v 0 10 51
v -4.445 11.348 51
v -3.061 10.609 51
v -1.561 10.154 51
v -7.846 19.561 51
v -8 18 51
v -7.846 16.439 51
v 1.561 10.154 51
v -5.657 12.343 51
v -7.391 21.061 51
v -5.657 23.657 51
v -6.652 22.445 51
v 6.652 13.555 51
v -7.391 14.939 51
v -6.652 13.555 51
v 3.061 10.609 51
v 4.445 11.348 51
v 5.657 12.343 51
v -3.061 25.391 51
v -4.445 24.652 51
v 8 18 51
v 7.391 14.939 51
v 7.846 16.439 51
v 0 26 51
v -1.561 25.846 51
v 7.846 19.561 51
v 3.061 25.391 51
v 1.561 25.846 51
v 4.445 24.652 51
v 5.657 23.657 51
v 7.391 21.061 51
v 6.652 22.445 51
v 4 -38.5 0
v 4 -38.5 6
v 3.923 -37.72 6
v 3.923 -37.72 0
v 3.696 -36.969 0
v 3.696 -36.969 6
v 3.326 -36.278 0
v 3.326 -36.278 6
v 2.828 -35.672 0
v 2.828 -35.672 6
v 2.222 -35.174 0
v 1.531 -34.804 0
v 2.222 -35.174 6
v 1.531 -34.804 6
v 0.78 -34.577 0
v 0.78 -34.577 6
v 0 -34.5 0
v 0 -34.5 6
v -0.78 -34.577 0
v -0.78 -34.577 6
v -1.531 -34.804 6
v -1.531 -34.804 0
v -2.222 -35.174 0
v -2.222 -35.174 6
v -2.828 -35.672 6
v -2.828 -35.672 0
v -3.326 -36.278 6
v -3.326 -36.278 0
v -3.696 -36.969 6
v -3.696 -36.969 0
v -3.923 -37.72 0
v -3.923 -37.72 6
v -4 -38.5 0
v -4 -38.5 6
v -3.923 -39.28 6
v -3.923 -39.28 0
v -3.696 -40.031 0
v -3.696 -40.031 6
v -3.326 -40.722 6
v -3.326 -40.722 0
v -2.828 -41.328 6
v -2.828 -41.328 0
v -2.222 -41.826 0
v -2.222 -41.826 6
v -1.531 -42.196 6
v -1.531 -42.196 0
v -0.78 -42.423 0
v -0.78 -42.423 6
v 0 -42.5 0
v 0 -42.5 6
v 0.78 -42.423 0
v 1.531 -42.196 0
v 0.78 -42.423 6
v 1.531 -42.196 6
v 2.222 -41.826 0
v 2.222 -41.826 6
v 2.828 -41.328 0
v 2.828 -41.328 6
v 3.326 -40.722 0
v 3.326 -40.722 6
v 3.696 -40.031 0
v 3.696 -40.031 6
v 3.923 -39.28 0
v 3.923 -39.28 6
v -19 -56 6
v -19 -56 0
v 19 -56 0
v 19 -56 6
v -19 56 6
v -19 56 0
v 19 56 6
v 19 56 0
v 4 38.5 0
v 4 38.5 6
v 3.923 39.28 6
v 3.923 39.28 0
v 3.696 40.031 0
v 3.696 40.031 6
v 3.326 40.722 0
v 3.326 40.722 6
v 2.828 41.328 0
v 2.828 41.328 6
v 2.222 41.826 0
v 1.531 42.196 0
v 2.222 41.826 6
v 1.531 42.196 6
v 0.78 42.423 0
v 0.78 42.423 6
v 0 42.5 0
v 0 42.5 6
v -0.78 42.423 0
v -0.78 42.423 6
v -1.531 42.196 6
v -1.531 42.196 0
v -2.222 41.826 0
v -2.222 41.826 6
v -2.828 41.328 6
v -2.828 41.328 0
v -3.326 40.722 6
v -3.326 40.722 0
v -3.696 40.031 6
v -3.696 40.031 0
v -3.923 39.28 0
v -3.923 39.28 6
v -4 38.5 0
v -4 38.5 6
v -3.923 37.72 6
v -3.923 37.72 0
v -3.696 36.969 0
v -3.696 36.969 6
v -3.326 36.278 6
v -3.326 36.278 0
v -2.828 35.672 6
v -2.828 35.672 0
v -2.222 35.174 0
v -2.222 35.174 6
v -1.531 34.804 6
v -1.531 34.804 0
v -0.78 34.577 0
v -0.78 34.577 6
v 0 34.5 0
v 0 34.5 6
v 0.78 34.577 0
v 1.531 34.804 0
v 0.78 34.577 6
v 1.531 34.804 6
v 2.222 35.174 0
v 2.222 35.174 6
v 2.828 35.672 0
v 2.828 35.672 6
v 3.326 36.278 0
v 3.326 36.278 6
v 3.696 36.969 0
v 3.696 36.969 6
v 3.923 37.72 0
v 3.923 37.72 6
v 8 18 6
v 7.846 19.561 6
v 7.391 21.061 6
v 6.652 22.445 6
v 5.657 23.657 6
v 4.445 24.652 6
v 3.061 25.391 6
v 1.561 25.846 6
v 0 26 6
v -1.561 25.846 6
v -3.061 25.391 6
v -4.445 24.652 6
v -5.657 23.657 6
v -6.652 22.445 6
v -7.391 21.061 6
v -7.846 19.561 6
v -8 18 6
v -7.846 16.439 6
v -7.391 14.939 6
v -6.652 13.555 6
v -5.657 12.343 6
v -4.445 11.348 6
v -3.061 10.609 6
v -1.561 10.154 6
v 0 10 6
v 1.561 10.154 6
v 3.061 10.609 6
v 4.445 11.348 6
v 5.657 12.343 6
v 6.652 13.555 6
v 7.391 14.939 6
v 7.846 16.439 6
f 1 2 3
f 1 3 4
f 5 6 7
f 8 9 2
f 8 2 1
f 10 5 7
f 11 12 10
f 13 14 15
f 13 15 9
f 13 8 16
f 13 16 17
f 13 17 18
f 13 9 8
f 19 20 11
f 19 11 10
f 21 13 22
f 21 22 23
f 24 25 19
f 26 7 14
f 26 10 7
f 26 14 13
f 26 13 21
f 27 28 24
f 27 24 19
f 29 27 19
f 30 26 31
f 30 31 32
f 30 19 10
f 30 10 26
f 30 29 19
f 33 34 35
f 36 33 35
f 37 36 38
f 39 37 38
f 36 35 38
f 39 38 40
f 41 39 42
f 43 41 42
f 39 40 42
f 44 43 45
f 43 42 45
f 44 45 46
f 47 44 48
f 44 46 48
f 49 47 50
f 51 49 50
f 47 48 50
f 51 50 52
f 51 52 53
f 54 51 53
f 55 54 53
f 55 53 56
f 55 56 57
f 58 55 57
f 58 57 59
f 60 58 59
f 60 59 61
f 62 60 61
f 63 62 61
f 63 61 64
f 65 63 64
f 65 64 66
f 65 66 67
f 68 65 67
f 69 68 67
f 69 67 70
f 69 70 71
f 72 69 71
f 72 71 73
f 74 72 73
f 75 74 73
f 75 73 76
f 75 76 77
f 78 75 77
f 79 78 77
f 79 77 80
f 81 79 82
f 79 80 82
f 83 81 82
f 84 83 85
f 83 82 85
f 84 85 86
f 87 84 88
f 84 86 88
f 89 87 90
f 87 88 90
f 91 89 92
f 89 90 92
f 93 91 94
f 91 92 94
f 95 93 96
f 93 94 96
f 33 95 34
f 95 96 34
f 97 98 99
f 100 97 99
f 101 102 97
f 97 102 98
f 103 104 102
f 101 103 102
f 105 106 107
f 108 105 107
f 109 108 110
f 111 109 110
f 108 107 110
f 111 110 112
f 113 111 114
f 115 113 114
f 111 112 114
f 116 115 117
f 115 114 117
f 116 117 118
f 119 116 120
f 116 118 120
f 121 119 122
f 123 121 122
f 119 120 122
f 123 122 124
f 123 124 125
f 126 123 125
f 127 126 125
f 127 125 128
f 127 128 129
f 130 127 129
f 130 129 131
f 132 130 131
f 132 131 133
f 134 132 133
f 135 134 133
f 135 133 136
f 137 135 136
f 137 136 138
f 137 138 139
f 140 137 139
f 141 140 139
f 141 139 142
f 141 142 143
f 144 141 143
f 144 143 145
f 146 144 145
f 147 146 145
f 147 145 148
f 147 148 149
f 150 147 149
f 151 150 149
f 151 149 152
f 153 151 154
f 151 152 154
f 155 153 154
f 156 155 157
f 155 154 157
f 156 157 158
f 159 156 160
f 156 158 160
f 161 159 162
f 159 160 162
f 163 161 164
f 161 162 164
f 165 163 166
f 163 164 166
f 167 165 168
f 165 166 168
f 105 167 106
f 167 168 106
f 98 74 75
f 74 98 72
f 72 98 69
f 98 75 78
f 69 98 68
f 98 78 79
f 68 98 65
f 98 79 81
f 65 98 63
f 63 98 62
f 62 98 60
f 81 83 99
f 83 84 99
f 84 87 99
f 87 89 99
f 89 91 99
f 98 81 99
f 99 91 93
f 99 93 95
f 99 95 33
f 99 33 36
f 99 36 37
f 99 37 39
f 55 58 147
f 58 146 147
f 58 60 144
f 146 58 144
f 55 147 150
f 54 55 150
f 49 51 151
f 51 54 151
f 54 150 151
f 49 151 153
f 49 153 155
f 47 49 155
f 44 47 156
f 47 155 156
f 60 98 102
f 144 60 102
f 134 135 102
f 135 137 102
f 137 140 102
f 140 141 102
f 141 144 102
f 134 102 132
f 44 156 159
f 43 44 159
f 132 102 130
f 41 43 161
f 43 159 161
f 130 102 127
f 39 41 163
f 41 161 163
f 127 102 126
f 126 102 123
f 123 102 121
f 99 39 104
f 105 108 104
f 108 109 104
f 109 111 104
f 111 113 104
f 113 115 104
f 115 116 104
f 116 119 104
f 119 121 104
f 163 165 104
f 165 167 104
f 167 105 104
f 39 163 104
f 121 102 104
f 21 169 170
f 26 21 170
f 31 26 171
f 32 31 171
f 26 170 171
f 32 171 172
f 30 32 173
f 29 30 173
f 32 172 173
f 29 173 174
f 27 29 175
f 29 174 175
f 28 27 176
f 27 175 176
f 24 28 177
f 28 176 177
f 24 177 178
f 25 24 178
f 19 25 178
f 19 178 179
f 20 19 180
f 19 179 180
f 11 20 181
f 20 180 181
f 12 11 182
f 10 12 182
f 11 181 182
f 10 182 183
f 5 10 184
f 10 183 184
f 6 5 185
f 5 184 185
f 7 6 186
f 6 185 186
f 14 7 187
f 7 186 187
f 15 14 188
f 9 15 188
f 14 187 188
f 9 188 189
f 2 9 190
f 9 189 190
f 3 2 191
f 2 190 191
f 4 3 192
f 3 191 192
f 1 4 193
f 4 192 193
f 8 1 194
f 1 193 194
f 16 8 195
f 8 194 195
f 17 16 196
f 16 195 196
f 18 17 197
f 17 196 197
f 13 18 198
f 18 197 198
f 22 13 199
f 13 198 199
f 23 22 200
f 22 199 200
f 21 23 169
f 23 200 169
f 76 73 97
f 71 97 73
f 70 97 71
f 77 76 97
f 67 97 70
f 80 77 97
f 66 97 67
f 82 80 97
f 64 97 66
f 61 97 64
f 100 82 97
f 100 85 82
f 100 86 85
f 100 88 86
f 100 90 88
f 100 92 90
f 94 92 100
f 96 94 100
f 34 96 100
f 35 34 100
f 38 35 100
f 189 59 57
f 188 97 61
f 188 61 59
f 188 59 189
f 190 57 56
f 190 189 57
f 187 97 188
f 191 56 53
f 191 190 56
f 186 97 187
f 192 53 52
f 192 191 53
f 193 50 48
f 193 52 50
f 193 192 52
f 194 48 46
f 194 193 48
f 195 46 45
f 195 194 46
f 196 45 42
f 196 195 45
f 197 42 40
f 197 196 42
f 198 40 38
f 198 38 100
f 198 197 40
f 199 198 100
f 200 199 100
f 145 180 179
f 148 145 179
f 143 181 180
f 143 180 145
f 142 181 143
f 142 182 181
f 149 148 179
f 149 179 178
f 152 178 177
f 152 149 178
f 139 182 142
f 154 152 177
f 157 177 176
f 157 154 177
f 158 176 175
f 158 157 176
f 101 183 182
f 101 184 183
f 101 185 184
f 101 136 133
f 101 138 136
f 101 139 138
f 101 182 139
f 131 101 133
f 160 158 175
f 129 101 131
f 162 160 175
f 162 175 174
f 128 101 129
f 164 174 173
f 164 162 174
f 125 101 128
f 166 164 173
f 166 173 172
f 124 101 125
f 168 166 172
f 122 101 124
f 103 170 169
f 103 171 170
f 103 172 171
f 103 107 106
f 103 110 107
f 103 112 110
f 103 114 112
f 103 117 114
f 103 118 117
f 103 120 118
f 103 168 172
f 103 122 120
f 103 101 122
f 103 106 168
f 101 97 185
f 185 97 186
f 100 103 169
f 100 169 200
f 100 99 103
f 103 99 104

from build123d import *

# Parameters (mm, degrees)
F1_DEPTH = 6
F2_R     = 4
F3_DEPTH = 6.001
F4_R     = 8
F5_DEPTH = 45


# Not quite as in the source:
# - a feature names something its author has since deleted; it is built from what else it names


with BuildPart() as f1:
    # F0 (on Top) → F1 (new body)
    with BuildSketch(Plane.XY):
        Polygon((-19, 56), (-19, 0), (-19, -56), (0, -56), (19, -56), (19, 0), (19, 56), (0, 56), align=None)
    extrude(amount=F1_DEPTH)

    # F2 (on face) → F3 (cut, through all)
    with BuildSketch(Plane.XY.offset(6)):
        with Locations((0, 38.5)):
            Circle(F2_R)
        with Locations((0, -38.5)):
            Circle(F2_R)
    extrude(amount=-F3_DEPTH, mode=Mode.SUBTRACT)

    # F4 (on face) → F5 (join)
    with BuildSketch(Plane.XY.offset(6)):
        with Locations((0, 18)):
            Circle(F4_R)
    extrude(amount=F5_DEPTH)


solid = f1.part
